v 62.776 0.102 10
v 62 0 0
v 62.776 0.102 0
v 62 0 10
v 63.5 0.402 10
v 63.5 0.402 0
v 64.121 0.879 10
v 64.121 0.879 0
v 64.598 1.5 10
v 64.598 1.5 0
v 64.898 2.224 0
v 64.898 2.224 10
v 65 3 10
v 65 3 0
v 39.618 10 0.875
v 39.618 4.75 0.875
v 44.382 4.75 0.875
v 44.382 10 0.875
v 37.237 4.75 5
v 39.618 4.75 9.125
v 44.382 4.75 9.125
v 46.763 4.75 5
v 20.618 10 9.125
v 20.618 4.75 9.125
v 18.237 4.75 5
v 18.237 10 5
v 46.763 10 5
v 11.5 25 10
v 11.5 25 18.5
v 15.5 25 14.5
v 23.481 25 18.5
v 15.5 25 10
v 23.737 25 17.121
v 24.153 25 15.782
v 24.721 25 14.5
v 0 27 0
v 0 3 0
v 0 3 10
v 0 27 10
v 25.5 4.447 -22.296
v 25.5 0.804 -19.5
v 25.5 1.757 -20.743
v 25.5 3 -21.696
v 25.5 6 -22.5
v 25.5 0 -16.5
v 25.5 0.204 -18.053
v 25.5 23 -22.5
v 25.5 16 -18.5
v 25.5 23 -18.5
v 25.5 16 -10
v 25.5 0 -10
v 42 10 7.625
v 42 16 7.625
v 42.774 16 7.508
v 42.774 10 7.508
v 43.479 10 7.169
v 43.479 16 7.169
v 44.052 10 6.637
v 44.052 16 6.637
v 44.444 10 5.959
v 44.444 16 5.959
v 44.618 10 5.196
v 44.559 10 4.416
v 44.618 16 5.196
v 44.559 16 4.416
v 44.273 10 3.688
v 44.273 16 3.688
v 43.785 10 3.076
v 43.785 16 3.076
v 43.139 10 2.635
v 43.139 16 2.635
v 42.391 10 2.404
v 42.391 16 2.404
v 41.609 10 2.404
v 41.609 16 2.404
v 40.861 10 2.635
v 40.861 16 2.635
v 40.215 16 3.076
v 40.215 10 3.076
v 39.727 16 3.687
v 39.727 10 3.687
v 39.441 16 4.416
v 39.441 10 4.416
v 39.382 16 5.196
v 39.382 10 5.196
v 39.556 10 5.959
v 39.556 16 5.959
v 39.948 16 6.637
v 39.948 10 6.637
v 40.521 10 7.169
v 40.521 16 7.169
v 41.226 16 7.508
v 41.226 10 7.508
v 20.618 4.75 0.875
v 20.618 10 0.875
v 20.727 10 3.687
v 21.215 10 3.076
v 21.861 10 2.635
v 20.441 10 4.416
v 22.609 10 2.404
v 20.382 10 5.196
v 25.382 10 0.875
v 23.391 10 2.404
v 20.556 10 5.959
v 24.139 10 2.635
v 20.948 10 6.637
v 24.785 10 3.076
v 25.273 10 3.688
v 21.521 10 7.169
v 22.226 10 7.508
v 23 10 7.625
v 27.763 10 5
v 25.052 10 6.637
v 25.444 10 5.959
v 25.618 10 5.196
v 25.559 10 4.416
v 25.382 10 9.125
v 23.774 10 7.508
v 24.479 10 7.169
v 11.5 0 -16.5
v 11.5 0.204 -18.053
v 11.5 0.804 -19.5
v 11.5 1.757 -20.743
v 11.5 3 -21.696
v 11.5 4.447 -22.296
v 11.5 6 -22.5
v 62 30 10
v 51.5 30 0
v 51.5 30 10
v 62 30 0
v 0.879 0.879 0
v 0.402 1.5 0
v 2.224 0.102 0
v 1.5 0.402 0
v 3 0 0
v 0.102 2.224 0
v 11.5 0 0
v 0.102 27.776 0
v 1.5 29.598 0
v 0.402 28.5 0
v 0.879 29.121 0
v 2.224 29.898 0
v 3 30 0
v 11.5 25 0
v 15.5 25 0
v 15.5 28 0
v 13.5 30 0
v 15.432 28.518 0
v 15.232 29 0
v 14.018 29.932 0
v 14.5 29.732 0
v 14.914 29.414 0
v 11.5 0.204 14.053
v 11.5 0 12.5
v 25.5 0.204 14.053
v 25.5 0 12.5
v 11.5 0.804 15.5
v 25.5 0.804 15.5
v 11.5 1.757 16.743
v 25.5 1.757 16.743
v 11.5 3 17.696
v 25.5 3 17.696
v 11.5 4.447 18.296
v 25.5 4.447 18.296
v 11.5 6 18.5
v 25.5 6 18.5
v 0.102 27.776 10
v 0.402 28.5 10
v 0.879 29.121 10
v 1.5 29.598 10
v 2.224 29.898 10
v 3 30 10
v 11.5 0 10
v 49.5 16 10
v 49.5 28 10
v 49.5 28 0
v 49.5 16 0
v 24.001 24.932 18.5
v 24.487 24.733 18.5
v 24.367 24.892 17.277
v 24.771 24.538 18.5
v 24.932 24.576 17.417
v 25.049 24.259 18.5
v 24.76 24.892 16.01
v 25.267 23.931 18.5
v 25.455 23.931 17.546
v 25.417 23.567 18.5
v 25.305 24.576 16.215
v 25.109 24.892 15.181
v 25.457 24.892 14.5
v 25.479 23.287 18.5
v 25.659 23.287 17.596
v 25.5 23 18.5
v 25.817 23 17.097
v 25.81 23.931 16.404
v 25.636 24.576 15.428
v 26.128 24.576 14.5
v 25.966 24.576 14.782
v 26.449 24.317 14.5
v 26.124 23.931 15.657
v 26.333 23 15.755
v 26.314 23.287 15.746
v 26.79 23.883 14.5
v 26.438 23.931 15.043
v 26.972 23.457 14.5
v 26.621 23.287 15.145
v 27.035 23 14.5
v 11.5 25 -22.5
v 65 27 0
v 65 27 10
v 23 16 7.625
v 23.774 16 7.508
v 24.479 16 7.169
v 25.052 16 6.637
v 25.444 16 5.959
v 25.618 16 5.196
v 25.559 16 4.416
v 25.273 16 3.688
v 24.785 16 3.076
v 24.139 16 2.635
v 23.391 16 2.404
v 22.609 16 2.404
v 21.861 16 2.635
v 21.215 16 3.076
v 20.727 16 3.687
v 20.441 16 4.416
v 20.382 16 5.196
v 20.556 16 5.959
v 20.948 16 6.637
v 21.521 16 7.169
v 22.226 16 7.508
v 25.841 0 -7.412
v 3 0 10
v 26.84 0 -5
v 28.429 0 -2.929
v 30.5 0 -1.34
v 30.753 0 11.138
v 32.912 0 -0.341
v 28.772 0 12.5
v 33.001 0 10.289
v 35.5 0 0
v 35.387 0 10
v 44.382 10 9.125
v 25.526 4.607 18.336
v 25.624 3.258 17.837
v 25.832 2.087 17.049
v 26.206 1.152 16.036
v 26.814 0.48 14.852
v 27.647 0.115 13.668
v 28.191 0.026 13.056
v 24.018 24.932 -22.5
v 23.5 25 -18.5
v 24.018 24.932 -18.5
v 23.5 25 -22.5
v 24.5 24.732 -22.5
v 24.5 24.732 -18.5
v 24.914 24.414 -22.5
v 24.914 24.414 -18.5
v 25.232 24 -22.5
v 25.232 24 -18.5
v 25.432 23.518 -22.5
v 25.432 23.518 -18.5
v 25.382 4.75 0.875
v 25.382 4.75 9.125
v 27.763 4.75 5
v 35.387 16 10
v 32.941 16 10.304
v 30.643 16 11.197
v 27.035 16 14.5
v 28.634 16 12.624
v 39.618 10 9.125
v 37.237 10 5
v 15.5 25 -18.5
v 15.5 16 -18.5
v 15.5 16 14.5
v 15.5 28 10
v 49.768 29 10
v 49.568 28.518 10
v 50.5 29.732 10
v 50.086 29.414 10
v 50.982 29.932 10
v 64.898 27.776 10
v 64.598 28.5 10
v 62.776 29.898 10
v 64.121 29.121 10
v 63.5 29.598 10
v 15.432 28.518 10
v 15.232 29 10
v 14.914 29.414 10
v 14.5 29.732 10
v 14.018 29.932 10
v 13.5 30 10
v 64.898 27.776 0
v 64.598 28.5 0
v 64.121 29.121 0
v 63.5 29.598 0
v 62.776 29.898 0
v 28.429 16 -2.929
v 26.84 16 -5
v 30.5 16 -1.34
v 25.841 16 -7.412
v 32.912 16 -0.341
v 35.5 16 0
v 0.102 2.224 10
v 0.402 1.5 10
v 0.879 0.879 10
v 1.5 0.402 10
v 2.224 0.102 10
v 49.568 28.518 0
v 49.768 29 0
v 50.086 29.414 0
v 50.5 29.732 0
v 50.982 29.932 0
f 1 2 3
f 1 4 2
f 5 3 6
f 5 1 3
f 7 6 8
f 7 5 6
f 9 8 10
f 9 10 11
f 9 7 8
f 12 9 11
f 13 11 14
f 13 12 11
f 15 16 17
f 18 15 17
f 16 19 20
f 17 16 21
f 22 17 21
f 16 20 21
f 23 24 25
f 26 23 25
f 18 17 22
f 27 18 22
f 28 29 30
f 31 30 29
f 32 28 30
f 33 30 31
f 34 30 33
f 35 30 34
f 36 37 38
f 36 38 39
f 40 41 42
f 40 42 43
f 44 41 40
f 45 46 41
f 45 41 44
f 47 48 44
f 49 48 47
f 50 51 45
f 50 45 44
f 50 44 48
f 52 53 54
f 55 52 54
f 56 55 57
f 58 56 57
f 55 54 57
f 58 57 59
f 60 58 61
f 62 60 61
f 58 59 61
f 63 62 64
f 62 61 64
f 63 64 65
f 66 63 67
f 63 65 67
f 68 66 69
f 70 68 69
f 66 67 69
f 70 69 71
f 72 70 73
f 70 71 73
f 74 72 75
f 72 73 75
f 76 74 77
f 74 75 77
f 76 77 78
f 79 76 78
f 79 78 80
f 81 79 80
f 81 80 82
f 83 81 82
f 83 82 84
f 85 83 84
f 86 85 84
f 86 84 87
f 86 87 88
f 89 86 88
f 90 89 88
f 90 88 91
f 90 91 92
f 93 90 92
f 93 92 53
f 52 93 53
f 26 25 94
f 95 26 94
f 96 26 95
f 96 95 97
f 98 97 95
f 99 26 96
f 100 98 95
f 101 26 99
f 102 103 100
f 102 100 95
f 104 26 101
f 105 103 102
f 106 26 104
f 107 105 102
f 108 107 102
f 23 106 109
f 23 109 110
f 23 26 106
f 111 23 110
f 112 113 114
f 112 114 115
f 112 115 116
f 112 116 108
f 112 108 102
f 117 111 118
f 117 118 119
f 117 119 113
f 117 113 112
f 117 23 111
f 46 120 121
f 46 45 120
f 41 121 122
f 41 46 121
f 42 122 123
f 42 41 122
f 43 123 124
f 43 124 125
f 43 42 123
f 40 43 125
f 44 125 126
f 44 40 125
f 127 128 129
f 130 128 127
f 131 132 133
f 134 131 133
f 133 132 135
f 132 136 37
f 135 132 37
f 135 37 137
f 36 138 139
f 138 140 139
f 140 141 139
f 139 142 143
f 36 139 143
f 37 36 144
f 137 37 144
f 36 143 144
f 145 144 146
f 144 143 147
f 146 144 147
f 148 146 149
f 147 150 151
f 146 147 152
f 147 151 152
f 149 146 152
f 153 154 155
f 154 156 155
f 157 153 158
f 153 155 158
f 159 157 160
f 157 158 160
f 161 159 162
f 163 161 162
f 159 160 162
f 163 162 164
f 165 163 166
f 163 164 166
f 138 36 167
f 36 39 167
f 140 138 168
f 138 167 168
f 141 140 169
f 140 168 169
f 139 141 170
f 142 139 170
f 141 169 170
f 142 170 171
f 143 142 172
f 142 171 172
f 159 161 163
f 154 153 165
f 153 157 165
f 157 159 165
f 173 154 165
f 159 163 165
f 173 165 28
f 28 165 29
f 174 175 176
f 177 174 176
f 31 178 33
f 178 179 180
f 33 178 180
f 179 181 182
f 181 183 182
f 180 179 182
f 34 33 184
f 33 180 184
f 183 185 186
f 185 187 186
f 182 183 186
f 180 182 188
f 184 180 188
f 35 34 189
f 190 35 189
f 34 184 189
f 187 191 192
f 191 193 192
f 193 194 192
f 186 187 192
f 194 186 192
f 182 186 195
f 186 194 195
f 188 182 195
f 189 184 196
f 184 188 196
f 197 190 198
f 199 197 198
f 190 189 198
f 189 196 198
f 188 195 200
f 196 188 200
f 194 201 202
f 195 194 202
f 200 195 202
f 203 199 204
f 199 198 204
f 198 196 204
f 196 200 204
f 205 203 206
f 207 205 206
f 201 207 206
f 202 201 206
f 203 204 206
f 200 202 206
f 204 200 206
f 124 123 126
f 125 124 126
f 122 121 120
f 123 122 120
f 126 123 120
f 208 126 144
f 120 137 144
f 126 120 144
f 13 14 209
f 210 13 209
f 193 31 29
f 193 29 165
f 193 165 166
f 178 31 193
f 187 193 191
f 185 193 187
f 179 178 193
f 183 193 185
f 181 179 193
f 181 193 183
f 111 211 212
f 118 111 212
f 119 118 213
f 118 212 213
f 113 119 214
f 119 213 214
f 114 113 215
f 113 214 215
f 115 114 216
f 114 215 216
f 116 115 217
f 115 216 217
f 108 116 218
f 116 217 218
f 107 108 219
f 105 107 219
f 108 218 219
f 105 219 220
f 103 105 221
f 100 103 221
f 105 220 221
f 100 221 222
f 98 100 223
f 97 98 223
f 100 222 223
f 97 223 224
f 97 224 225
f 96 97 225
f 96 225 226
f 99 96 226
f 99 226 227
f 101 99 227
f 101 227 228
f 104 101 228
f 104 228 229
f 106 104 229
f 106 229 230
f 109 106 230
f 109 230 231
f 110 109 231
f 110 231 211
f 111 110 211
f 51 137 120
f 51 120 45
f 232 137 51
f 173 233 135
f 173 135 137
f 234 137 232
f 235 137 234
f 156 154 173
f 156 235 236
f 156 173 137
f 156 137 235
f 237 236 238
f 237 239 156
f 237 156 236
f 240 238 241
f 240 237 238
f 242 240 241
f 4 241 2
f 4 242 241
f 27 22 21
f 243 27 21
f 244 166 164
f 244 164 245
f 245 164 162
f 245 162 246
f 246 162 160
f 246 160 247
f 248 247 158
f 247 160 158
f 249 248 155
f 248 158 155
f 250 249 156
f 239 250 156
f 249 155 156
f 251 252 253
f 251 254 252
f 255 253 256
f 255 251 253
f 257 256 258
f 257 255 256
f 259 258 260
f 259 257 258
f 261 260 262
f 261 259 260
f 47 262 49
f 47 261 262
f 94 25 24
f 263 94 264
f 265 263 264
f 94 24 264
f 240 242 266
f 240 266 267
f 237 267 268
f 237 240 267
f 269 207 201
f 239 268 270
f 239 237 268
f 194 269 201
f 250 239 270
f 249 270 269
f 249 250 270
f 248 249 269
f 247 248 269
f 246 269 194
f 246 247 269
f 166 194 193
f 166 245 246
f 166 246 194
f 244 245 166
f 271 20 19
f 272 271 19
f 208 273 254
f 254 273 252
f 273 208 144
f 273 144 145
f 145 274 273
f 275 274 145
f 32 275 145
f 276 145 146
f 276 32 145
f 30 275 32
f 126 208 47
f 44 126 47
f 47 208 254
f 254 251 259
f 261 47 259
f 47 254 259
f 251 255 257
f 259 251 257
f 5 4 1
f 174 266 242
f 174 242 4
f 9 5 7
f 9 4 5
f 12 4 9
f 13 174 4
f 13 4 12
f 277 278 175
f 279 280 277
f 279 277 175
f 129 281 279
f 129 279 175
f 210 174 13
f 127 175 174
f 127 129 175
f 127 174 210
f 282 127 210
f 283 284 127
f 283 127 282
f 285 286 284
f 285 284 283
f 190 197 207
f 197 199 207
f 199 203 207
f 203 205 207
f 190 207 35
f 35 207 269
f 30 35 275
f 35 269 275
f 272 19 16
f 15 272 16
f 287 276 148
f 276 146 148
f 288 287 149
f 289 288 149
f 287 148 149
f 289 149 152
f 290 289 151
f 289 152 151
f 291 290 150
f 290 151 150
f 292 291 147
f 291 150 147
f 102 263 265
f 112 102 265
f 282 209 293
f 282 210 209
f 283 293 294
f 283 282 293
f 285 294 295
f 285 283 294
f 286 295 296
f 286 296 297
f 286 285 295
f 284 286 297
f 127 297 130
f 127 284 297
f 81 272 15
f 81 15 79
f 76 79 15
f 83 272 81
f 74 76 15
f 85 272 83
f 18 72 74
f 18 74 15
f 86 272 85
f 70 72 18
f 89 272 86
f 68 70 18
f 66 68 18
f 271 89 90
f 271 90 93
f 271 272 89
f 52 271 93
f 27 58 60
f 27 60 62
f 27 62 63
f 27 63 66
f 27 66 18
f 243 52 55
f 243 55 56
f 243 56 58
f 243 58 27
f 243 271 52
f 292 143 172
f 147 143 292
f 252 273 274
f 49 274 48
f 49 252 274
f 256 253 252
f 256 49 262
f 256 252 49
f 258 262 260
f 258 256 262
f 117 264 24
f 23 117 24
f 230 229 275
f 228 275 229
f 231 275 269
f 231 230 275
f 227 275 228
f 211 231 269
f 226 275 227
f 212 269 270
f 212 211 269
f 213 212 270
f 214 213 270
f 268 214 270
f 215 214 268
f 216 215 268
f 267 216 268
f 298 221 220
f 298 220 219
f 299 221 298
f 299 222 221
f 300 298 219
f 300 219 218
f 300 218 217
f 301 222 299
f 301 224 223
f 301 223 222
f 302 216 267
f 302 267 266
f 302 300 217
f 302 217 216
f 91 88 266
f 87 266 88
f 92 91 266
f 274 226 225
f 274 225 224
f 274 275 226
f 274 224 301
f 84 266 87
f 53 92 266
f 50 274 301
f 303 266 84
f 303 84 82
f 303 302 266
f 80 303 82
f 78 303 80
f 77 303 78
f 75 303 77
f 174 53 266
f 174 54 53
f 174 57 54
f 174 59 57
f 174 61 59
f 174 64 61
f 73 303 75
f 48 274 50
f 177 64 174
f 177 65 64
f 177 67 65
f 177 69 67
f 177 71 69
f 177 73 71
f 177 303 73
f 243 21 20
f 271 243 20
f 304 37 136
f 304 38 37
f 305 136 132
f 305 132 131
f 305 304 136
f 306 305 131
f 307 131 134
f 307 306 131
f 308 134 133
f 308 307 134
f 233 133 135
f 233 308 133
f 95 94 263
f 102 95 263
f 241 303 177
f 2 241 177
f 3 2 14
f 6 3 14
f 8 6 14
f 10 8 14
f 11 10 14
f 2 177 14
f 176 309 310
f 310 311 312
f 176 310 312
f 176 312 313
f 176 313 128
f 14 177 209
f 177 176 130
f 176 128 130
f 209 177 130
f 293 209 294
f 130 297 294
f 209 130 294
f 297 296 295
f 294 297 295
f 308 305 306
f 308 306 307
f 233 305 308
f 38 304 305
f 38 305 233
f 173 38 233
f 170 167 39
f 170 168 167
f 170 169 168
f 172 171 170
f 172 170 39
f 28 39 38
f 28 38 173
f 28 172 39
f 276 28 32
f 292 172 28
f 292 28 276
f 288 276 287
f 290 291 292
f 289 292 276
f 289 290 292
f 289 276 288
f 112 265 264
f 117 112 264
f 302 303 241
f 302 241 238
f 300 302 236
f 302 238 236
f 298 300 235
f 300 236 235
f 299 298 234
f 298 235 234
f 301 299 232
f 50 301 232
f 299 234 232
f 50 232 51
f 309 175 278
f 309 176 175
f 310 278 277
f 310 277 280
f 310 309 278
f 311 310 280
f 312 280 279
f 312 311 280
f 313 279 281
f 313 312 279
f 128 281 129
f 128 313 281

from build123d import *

# Parameters (mm, degrees)
SKETCH1_W           = 65
SKETCH1_H           = 30
BOSS_EXTRUDE1_DEPTH = 10
SKETCH2_W           = 34
SKETCH2_H           = 10
CUT_EXTRUDE1_DEPTH  = 14
SKETCH4_R           = 2.625
CUT_EXTRUDE3_DEPTH  = 45
FILLET1_R           = 3
SKETCH5_W           = 10
SKETCH5_H           = 4.5
SKETCH5_H_2         = 18.5
BOSS_EXTRUDE2_DEPTH = 16
CUT_EXTRUDE2_DEPTH  = 10
SKETCH6_W           = 10
SKETCH6_H           = 25
BOSS_EXTRUDE3_DEPTH = 4
BOSS_EXTRUDE4_START = -33
SKETCH6_2_W         = 10
SKETCH6_2_H         = 25
BOSS_EXTRUDE4_DEPTH = 4
BOSS_EXTRUDE7_REACH = 84.498
SKETCH7_W           = 4
SKETCH7_H           = 25
FILLET2_R           = 6
FILLET4_START       = 2.3595
FILLET4_DEPTH       = 13.6405
FILLET4_2_DEPTH     = 2.8314
FILLET4_START_2     = 6.0000001
FILLET4_3_DEPTH     = 18.9999999
FILLET4_START_3     = 25.5
FILLET4_4_DEPTH     = 9.886859967
FILLET4_5_DEPTH     = 6.00000009
FILLET7_R           = 2
BOSS_EXTRUDE8_DEPTH = 4.75


with BuildPart() as part:
    # Sketch1 → Boss-Extrude1 (new body)
    with BuildSketch(Plane.XY):
        with Locations((32.5, 15)):
            Rectangle(SKETCH1_W, SKETCH1_H)
    extrude(amount=BOSS_EXTRUDE1_DEPTH)

    # Sketch2 → Cut-Extrude1 (cut)
    with BuildSketch(Plane(origin=(0, 30, 0), x_dir=(1, 0, 0), z_dir=(0, 1, 0))):
        with Locations((32.5, -5)):
            Rectangle(SKETCH2_W, SKETCH2_H)
    extrude(amount=-CUT_EXTRUDE1_DEPTH, mode=Mode.SUBTRACT)

    # Sketch4 → Cut-Extrude3 (cut)
    with BuildSketch(Plane(origin=(0, 16, 0), x_dir=(1, 0, 0), z_dir=(0, 1, 0))):
        with Locations(Location((23, -5, 0), (0, 0, 270))):
            Circle(SKETCH4_R)
        with Locations(Location((42, -5, 0), (0, 0, 270))):
            Circle(SKETCH4_R)
    extrude(amount=-CUT_EXTRUDE3_DEPTH, mode=Mode.SUBTRACT)

    # Fillet1
    fillet1_edges = [part.edges().sort_by_distance(p)[0] for p in [
        (0, 30, 5),
        (0, 0, 5),
        (65, 0, 5),
        (65, 30, 5),
    ]]
    fillet(fillet1_edges, radius=FILLET1_R)

    # Sketch5 → Boss-Extrude2 (add)
    with BuildSketch(Plane(origin=(0, 16, 0), x_dir=(1, 0, 0), z_dir=(0, 1, 0))):
        with Locations((20.5, -12.25)):
            Rectangle(SKETCH5_W, SKETCH5_H)
        with BuildLine():
            Line((25.5, 0), (15.5, 0))
            Line((15.5, 0), (15.5, -10))
            Line((15.5, -10), (25.5, -10))
            Line((25.5, -10), (25.5, -5.80039053))
            ThreePointArc((25.5, -5.80039053), (20.375, -5), (25.5, -4.19960947))
            Line((25.5, -4.19960947), (25.5, 0))
        make_face()
        with Locations((20.5, 9.25)):
            Rectangle(SKETCH5_W, SKETCH5_H_2)
    extrude(amount=-BOSS_EXTRUDE2_DEPTH)

    # Sketch3 → Cut-Extrude2 (cut)
    with BuildSketch(Plane.XZ):
        Polygon((20.61843014, 9.125), (18.236860279, 5), (20.61843014, 0.875), (25.38156986, 0.875), (27.763139721, 5), (25.38156986, 9.125), align=None)
        Polygon((46.763139721, 5), (44.38156986, 9.125), (39.61843014, 9.125), (37.236860279, 5), (39.61843014, 0.875), (44.38156986, 0.875), align=None)
    extrude(amount=-CUT_EXTRUDE2_DEPTH, mode=Mode.SUBTRACT)

    # Sketch6 → Boss-Extrude3 (add)
    with BuildSketch(Plane.XY.offset(14.5)):
        with Locations((20.5, 12.5)):
            Rectangle(SKETCH6_W, SKETCH6_H)
    extrude(amount=BOSS_EXTRUDE3_DEPTH)

    # Sketch6<2> → Boss-Extrude4 (add)
    with BuildSketch(Plane.XY.offset(14.5).offset(BOSS_EXTRUDE4_START)):
        with Locations((20.5, 12.5)):
            Rectangle(SKETCH6_2_W, SKETCH6_2_H)
    extrude(amount=-BOSS_EXTRUDE4_DEPTH)

    # Boss-Extrude7: up to this face of the body (flat: up to its plane)
    boss_extrude7_end = Plane(part.part.faces().sort_by_distance((20.5, 12.5, -22.5))[0])
    # Sketch7 → Boss-Extrude7 (add, up to the picked face)
    with BuildSketch(Plane.XY.offset(18.5), mode=Mode.PRIVATE) as boss_extrude7_sk1:
        with Locations((13.5, 12.5)):
            Rectangle(SKETCH7_W, SKETCH7_H)
    boss_extrude7_tool1 = split(extrude(boss_extrude7_sk1.sketch, amount=-BOSS_EXTRUDE7_REACH, mode=Mode.PRIVATE), bisect_by=boss_extrude7_end, keep=Keep.BOTH, mode=Mode.PRIVATE)
    add(boss_extrude7_tool1.solids().sort_by(Axis((13.5, 12.5, 18.5), (0, 0, -1)))[0])

    # Fillet2
    fillet2_edges = [part.edges().sort_by_distance(p)[0] for p in [
        (18.5, 0, 18.5),
        (18.5, 0, -22.5),
    ]]
    fillet(fillet2_edges, radius=FILLET2_R)

    # Fillet4: read off the stored shape, not the designer's step
    # Fillet4 outline → Fillet4 (add)
    with BuildSketch(Plane(origin=(0, 0, 0), x_dir=(1, 0, 0), z_dir=(0, 1, 0)).offset(FILLET4_START)):
        with BuildLine():
            Line((25.5, -14.5), (27.035213422, -14.5))
            ThreePointArc((27.035213422, -14.5), (30.643443476, -11.196591569), (35.386859967, -10))
            Line((35.386859967, -10), (25.5, -10))
            Line((25.5, -10), (25.5, -14.5))
        make_face()
        with BuildLine():
            ThreePointArc((35.5, 0), (28.428932188, 2.928932188), (25.5, 10))
            Line((25.5, 10), (25.5, 0))
            Line((25.5, 0), (35.5, 0))
        make_face()
    extrude(amount=FILLET4_DEPTH)

    # Fillet4 2 outline → Fillet4 2 (add)
    with BuildSketch(Plane(origin=(0, 0, 0), x_dir=(1, 0, 0), z_dir=(0, 1, 0))):
        with BuildLine():
            ThreePointArc((35.5, 0), (28.428932188, 2.928932188), (25.5, 10))
            Line((25.5, 10), (25.5, 0))
            Line((25.5, 0), (35.5, 0))
        make_face()
    extrude(amount=FILLET4_2_DEPTH)

    # Fillet4 3 outline → Fillet4 3 (add)
    with BuildSketch(Plane(origin=(0, 0, 0), x_dir=(1, 0, 0), z_dir=(0, 1, 0)).offset(FILLET4_START_2)):
        with BuildLine():
            ThreePointArc((25.5, -18.5), (26.050866182, -16.416814258), (27.035213422, -14.5))
            Line((27.035213422, -14.5), (25.5, -14.5))
            Line((25.5, -14.5), (25.5, -18.5))
        make_face()
    extrude(amount=FILLET4_3_DEPTH)

    # Fillet4 4 outline → Fillet4 4 (add)
    with BuildSketch(Plane.YZ.offset(FILLET4_START_3)):
        with BuildLine():
            Line((0, 12.5), (0, 10))
            Line((0, 10), (2.3595, 10))
            Line((2.3595, 10), (2.3595, 14.5))
            Line((2.3595, 14.5), (6.0000001, 14.5))
            Line((6.0000001, 14.5), (6, 18.5))
            ThreePointArc((6, 18.5), (1.757359313, 16.742640687), (0, 12.5))
        make_face()
    extrude(amount=FILLET4_4_DEPTH)

    # Fillet4 5 outline → Fillet4 5 (cut)
    with BuildSketch(Plane(origin=(0, 0, 0), x_dir=(1, 0, 0), z_dir=(0, 1, 0))):
        with BuildLine():
            Line((25.5, -18.5), (25.272425218, -20))
            Line((25.272425218, -20), (35.386859967, -20))
            Line((35.386859967, -20), (35.386859967, -10))
            ThreePointArc((35.386859967, -10), (28.867657561, -12.417124556), (25.5, -18.5))
        make_face()
    extrude(amount=FILLET4_5_DEPTH, mode=Mode.SUBTRACT)

    # Fillet7
    fillet7_edges = [part.edges().sort_by_distance(p)[0] for p in [
        (25.5, 25, -20.5),
        (15.5, 30, 5),
        (49.5, 30, 5),
        (26.050866182, 25, 16.416814258),
    ]]
    fillet(fillet7_edges, radius=FILLET7_R)

    # Sketch3<2> → Boss-Extrude8 (add)
    with BuildSketch(Plane.XZ):
        Polygon((20.61843014, 9.125), (18.236860279, 5), (20.61843014, 0.875), (25.38156986, 0.875), (27.763139721, 5), (25.38156986, 9.125), align=None)
        Polygon((46.763139721, 5), (44.38156986, 9.125), (39.61843014, 9.125), (37.236860279, 5), (39.61843014, 0.875), (44.38156986, 0.875), align=None)
    extrude(amount=-BOSS_EXTRUDE8_DEPTH)


solid = part.part
